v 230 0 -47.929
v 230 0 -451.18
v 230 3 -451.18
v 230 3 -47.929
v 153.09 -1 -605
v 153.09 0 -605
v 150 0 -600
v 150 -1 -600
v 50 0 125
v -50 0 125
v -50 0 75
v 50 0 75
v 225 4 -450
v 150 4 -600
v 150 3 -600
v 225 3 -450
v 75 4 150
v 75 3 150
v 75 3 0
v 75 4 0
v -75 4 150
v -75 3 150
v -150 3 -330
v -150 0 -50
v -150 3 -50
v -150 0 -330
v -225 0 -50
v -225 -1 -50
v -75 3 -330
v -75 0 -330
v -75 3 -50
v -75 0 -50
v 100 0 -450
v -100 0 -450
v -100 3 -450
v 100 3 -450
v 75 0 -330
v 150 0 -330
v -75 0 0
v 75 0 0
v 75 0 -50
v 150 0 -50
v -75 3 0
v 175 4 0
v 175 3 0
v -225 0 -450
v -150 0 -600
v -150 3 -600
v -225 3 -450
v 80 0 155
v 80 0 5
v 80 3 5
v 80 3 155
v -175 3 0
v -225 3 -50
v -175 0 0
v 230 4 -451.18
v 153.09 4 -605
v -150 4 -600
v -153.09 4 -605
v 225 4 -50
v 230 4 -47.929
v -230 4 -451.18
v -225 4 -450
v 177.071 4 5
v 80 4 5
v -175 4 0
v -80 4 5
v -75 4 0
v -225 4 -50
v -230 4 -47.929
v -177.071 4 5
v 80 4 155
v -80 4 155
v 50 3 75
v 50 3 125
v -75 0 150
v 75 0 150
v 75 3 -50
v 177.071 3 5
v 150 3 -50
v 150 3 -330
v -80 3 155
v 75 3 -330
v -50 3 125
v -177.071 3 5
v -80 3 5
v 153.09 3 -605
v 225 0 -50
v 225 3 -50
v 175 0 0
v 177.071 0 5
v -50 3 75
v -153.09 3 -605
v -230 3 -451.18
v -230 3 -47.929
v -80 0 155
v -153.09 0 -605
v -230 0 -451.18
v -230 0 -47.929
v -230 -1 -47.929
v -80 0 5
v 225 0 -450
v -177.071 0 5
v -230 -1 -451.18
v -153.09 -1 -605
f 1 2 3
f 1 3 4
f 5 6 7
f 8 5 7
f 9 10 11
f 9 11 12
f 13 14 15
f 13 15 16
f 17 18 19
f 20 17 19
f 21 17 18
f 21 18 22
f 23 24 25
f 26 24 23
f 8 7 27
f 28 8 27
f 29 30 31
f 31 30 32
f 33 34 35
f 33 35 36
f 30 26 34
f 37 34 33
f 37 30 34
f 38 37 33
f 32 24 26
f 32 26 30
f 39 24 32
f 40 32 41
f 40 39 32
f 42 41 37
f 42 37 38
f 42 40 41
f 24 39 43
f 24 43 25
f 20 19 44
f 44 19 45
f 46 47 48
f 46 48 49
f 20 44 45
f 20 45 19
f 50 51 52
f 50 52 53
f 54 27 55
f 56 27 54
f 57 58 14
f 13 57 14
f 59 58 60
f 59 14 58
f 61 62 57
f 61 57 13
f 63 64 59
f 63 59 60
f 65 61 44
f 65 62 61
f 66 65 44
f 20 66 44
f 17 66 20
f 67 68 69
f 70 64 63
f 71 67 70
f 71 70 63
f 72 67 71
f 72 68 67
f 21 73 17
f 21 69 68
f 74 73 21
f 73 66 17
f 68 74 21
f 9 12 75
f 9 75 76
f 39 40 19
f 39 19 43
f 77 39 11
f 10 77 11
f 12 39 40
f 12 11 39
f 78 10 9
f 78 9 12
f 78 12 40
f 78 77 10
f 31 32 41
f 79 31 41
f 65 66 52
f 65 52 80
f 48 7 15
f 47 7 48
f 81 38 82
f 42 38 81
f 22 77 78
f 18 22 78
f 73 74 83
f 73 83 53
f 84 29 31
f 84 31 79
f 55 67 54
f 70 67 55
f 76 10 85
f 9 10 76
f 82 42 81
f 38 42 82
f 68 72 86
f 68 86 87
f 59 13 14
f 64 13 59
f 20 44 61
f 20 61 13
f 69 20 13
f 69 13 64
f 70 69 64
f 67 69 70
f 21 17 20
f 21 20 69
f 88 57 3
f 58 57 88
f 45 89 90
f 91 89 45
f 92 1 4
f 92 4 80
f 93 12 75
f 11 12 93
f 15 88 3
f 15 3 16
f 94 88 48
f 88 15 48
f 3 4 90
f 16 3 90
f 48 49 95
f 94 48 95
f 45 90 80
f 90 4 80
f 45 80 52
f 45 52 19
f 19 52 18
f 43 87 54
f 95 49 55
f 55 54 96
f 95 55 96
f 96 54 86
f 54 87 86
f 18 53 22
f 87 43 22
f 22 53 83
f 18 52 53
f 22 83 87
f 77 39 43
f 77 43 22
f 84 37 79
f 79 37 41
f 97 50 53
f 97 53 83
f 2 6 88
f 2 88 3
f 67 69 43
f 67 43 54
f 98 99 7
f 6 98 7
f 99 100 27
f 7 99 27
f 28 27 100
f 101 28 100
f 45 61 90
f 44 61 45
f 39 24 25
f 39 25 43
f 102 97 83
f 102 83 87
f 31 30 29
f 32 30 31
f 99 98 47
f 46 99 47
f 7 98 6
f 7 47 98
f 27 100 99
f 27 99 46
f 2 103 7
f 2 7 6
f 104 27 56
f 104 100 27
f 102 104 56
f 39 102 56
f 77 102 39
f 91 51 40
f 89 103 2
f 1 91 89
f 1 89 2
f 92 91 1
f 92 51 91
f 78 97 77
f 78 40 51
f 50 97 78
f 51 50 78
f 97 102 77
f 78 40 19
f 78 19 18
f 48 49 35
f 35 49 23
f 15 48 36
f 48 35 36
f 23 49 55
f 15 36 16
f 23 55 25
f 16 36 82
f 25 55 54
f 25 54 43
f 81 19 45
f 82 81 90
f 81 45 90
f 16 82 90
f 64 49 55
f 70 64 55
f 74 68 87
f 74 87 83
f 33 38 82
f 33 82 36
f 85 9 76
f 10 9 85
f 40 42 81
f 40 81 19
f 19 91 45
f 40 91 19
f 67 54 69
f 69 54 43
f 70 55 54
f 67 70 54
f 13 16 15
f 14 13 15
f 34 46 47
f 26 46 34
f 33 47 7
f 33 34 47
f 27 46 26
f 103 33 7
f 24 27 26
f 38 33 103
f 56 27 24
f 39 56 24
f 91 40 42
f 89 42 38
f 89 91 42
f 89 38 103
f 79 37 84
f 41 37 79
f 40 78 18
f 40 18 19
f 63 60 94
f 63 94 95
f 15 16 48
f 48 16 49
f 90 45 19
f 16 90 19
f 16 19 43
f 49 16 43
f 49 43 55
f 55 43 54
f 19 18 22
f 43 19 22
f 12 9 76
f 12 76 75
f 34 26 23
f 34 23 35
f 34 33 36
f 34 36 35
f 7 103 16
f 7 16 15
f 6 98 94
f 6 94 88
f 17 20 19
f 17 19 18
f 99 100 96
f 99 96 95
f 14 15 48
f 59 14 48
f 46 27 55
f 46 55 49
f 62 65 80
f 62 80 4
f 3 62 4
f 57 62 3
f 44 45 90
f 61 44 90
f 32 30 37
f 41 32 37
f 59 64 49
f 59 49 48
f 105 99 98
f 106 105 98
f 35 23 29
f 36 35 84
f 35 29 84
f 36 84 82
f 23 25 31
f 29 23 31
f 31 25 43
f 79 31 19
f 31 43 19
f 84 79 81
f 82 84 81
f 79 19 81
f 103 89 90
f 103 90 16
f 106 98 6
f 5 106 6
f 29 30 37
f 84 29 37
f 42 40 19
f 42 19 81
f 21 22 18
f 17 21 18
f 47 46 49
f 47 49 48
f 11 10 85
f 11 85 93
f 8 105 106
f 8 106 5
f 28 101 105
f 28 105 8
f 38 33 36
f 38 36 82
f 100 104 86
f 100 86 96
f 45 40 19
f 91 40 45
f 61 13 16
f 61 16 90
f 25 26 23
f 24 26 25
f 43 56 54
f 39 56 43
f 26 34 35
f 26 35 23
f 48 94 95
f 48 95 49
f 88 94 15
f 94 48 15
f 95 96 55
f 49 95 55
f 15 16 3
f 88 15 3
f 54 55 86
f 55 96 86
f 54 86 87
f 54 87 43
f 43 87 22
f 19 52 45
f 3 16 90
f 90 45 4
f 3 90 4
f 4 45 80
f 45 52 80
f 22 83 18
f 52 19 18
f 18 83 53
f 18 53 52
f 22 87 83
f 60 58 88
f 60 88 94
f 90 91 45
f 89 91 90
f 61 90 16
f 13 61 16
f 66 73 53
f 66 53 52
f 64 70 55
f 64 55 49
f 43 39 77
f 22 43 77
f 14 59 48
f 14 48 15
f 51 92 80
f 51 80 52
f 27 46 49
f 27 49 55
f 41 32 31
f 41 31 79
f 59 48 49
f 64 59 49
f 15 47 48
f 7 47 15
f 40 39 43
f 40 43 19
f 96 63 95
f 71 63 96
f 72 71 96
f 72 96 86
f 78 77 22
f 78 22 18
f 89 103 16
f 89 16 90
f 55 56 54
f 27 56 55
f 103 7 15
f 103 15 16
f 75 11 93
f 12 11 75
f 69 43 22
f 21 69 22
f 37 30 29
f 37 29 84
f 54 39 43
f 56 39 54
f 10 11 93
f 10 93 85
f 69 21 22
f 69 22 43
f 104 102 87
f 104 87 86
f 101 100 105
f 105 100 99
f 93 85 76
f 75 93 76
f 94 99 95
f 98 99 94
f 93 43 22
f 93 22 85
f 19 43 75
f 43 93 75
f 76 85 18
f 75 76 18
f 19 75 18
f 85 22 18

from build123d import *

# Parameters (mm, degrees)
F1_DEPTH  = 3
F2_W      = 150
F2_H      = 150
F3_DEPTH  = 3
F4_W      = 150
F4_H      = 280
F5_DEPTH  = 3
F6_W      = 150
F6_H      = 280
F7_DEPTH  = 3
F9_DEPTH  = 3
F11_DEPTH = 3
F13_DEPTH = 1
F15_DEPTH = 1
F17_DEPTH = 1


with BuildPart() as f1:
    # F0 (on Front) → F1 (new body)
    with BuildSketch(Plane.XZ):
        Polygon((50, 125), (0, 125), (-50, 125), (-50, 100), (-50, 75), (0, 75), (50, 75), (50, 100), align=None)
    extrude(amount=-F1_DEPTH)


with BuildPart() as f3:
    # F2 (on Front) → F3 (new body)
    with BuildSketch(Plane.XZ):
        with Locations((0, 75)):
            Rectangle(F2_W, F2_H)
        Polygon((-50, 125), (0, 125), (50, 125), (50, 100), (50, 75), (0, 75), (-50, 75), (-50, 100), align=None, mode=Mode.SUBTRACT)
    extrude(amount=-F3_DEPTH)


with BuildPart() as f5:
    # F4 (on Front) → F5 (new body)
    with BuildSketch(Plane.XZ):
        with Locations((0, -190)):
            Rectangle(F4_W, F4_H)
    extrude(amount=-F5_DEPTH)


with BuildPart() as f7:
    # F6 (on Front) → F7 (new body)
    with BuildSketch(Plane.XZ):
        Polygon((75, 0), (-75, 0), (-150, -50), (-150, -330), (-100, -450), (100, -450), (150, -330), (150, -50), align=None)
        with Locations((0, -190)):
            Rectangle(F6_W, F6_H, mode=Mode.SUBTRACT)
    extrude(amount=-F7_DEPTH)


with BuildPart() as f9:
    # F8 (on face) → F9 (new body)
    with BuildSketch(Plane.XZ):
        Polygon((175, 0), (75, 0), (150, -50), (150, -330), (100, -450), (-100, -450), (-150, -330), (-150, -50), (-75, 0), (-175, 0), (-225, -50), (-225, -450), (-150, -600), (150, -600), (225, -450), (225, -50), align=None)
    extrude(amount=-F9_DEPTH)


with BuildPart() as f11:
    # F10 (on face) → F11 (new body)
    with BuildSketch(Plane.XZ):
        Polygon((230, -47.928932), (177.071068, 5), (80, 5), (80, 155), (-80, 155), (-80, 5), (-177.071068, 5), (-230, -47.928932), (-230, -451.18034), (-153.09017, -605), (153.09017, -605), (230, -451.18034), align=None)
        Polygon((-75, 150), (75, 150), (75, 0), (175, 0), (225, -50), (225, -450), (150, -600), (-150, -600), (-225, -450), (-225, -50), (-175, 0), (-75, 0), align=None, mode=Mode.SUBTRACT)
    extrude(amount=-F11_DEPTH)


with BuildPart() as f13:
    # F12 (on face) → F13 (new body)
    with BuildSketch(Plane(origin=(0, 3, 0), x_dir=(-1, 0, 0), z_dir=(0, 1, 0))):
        Polygon((75, 0), (75, 150), (-75, 150), (-75, 0), (-175, 0), (-225, -50), (-225, -450), (-150, -600), (150, -600), (225, -450), (225, -50), (175, 0), align=None)
    extrude(amount=F13_DEPTH)


with BuildPart() as f15:
    # F14 (on face) → F15 (new body)
    with BuildSketch(Plane(origin=(0, 4, 0), x_dir=(-1, 0, 0), z_dir=(0, 1, 0))):
        Polygon((80, 155), (-80, 155), (-80, 5), (-177.071068, 5), (-230, -47.928932), (-230, -451.18034), (-153.09017, -605), (153.09017, -605), (230, -451.18034), (230, -47.928932), (177.071068, 5), (80, 5), align=None)
        Polygon((-75, 0), (-75, 150), (75, 150), (75, 0), (175, 0), (225, -50), (225, -450), (150, -600), (-150, -600), (-225, -450), (-225, -50), (-175, 0), align=None, mode=Mode.SUBTRACT)
    extrude(amount=-F15_DEPTH)


with BuildPart() as f17:
    # F16 (on face) → F17 (new body)
    with BuildSketch(Plane.XZ):
        Polygon((-230, -451.18034), (-153.09017, -605), (153.09017, -605), (150, -600), (-225, -50), (-230, -47.928932), align=None)
    extrude(amount=F17_DEPTH)


solid = Compound([f1.part, f3.part, f5.part, f7.part, f9.part, f11.part, f13.part, f15.part, f17.part])
